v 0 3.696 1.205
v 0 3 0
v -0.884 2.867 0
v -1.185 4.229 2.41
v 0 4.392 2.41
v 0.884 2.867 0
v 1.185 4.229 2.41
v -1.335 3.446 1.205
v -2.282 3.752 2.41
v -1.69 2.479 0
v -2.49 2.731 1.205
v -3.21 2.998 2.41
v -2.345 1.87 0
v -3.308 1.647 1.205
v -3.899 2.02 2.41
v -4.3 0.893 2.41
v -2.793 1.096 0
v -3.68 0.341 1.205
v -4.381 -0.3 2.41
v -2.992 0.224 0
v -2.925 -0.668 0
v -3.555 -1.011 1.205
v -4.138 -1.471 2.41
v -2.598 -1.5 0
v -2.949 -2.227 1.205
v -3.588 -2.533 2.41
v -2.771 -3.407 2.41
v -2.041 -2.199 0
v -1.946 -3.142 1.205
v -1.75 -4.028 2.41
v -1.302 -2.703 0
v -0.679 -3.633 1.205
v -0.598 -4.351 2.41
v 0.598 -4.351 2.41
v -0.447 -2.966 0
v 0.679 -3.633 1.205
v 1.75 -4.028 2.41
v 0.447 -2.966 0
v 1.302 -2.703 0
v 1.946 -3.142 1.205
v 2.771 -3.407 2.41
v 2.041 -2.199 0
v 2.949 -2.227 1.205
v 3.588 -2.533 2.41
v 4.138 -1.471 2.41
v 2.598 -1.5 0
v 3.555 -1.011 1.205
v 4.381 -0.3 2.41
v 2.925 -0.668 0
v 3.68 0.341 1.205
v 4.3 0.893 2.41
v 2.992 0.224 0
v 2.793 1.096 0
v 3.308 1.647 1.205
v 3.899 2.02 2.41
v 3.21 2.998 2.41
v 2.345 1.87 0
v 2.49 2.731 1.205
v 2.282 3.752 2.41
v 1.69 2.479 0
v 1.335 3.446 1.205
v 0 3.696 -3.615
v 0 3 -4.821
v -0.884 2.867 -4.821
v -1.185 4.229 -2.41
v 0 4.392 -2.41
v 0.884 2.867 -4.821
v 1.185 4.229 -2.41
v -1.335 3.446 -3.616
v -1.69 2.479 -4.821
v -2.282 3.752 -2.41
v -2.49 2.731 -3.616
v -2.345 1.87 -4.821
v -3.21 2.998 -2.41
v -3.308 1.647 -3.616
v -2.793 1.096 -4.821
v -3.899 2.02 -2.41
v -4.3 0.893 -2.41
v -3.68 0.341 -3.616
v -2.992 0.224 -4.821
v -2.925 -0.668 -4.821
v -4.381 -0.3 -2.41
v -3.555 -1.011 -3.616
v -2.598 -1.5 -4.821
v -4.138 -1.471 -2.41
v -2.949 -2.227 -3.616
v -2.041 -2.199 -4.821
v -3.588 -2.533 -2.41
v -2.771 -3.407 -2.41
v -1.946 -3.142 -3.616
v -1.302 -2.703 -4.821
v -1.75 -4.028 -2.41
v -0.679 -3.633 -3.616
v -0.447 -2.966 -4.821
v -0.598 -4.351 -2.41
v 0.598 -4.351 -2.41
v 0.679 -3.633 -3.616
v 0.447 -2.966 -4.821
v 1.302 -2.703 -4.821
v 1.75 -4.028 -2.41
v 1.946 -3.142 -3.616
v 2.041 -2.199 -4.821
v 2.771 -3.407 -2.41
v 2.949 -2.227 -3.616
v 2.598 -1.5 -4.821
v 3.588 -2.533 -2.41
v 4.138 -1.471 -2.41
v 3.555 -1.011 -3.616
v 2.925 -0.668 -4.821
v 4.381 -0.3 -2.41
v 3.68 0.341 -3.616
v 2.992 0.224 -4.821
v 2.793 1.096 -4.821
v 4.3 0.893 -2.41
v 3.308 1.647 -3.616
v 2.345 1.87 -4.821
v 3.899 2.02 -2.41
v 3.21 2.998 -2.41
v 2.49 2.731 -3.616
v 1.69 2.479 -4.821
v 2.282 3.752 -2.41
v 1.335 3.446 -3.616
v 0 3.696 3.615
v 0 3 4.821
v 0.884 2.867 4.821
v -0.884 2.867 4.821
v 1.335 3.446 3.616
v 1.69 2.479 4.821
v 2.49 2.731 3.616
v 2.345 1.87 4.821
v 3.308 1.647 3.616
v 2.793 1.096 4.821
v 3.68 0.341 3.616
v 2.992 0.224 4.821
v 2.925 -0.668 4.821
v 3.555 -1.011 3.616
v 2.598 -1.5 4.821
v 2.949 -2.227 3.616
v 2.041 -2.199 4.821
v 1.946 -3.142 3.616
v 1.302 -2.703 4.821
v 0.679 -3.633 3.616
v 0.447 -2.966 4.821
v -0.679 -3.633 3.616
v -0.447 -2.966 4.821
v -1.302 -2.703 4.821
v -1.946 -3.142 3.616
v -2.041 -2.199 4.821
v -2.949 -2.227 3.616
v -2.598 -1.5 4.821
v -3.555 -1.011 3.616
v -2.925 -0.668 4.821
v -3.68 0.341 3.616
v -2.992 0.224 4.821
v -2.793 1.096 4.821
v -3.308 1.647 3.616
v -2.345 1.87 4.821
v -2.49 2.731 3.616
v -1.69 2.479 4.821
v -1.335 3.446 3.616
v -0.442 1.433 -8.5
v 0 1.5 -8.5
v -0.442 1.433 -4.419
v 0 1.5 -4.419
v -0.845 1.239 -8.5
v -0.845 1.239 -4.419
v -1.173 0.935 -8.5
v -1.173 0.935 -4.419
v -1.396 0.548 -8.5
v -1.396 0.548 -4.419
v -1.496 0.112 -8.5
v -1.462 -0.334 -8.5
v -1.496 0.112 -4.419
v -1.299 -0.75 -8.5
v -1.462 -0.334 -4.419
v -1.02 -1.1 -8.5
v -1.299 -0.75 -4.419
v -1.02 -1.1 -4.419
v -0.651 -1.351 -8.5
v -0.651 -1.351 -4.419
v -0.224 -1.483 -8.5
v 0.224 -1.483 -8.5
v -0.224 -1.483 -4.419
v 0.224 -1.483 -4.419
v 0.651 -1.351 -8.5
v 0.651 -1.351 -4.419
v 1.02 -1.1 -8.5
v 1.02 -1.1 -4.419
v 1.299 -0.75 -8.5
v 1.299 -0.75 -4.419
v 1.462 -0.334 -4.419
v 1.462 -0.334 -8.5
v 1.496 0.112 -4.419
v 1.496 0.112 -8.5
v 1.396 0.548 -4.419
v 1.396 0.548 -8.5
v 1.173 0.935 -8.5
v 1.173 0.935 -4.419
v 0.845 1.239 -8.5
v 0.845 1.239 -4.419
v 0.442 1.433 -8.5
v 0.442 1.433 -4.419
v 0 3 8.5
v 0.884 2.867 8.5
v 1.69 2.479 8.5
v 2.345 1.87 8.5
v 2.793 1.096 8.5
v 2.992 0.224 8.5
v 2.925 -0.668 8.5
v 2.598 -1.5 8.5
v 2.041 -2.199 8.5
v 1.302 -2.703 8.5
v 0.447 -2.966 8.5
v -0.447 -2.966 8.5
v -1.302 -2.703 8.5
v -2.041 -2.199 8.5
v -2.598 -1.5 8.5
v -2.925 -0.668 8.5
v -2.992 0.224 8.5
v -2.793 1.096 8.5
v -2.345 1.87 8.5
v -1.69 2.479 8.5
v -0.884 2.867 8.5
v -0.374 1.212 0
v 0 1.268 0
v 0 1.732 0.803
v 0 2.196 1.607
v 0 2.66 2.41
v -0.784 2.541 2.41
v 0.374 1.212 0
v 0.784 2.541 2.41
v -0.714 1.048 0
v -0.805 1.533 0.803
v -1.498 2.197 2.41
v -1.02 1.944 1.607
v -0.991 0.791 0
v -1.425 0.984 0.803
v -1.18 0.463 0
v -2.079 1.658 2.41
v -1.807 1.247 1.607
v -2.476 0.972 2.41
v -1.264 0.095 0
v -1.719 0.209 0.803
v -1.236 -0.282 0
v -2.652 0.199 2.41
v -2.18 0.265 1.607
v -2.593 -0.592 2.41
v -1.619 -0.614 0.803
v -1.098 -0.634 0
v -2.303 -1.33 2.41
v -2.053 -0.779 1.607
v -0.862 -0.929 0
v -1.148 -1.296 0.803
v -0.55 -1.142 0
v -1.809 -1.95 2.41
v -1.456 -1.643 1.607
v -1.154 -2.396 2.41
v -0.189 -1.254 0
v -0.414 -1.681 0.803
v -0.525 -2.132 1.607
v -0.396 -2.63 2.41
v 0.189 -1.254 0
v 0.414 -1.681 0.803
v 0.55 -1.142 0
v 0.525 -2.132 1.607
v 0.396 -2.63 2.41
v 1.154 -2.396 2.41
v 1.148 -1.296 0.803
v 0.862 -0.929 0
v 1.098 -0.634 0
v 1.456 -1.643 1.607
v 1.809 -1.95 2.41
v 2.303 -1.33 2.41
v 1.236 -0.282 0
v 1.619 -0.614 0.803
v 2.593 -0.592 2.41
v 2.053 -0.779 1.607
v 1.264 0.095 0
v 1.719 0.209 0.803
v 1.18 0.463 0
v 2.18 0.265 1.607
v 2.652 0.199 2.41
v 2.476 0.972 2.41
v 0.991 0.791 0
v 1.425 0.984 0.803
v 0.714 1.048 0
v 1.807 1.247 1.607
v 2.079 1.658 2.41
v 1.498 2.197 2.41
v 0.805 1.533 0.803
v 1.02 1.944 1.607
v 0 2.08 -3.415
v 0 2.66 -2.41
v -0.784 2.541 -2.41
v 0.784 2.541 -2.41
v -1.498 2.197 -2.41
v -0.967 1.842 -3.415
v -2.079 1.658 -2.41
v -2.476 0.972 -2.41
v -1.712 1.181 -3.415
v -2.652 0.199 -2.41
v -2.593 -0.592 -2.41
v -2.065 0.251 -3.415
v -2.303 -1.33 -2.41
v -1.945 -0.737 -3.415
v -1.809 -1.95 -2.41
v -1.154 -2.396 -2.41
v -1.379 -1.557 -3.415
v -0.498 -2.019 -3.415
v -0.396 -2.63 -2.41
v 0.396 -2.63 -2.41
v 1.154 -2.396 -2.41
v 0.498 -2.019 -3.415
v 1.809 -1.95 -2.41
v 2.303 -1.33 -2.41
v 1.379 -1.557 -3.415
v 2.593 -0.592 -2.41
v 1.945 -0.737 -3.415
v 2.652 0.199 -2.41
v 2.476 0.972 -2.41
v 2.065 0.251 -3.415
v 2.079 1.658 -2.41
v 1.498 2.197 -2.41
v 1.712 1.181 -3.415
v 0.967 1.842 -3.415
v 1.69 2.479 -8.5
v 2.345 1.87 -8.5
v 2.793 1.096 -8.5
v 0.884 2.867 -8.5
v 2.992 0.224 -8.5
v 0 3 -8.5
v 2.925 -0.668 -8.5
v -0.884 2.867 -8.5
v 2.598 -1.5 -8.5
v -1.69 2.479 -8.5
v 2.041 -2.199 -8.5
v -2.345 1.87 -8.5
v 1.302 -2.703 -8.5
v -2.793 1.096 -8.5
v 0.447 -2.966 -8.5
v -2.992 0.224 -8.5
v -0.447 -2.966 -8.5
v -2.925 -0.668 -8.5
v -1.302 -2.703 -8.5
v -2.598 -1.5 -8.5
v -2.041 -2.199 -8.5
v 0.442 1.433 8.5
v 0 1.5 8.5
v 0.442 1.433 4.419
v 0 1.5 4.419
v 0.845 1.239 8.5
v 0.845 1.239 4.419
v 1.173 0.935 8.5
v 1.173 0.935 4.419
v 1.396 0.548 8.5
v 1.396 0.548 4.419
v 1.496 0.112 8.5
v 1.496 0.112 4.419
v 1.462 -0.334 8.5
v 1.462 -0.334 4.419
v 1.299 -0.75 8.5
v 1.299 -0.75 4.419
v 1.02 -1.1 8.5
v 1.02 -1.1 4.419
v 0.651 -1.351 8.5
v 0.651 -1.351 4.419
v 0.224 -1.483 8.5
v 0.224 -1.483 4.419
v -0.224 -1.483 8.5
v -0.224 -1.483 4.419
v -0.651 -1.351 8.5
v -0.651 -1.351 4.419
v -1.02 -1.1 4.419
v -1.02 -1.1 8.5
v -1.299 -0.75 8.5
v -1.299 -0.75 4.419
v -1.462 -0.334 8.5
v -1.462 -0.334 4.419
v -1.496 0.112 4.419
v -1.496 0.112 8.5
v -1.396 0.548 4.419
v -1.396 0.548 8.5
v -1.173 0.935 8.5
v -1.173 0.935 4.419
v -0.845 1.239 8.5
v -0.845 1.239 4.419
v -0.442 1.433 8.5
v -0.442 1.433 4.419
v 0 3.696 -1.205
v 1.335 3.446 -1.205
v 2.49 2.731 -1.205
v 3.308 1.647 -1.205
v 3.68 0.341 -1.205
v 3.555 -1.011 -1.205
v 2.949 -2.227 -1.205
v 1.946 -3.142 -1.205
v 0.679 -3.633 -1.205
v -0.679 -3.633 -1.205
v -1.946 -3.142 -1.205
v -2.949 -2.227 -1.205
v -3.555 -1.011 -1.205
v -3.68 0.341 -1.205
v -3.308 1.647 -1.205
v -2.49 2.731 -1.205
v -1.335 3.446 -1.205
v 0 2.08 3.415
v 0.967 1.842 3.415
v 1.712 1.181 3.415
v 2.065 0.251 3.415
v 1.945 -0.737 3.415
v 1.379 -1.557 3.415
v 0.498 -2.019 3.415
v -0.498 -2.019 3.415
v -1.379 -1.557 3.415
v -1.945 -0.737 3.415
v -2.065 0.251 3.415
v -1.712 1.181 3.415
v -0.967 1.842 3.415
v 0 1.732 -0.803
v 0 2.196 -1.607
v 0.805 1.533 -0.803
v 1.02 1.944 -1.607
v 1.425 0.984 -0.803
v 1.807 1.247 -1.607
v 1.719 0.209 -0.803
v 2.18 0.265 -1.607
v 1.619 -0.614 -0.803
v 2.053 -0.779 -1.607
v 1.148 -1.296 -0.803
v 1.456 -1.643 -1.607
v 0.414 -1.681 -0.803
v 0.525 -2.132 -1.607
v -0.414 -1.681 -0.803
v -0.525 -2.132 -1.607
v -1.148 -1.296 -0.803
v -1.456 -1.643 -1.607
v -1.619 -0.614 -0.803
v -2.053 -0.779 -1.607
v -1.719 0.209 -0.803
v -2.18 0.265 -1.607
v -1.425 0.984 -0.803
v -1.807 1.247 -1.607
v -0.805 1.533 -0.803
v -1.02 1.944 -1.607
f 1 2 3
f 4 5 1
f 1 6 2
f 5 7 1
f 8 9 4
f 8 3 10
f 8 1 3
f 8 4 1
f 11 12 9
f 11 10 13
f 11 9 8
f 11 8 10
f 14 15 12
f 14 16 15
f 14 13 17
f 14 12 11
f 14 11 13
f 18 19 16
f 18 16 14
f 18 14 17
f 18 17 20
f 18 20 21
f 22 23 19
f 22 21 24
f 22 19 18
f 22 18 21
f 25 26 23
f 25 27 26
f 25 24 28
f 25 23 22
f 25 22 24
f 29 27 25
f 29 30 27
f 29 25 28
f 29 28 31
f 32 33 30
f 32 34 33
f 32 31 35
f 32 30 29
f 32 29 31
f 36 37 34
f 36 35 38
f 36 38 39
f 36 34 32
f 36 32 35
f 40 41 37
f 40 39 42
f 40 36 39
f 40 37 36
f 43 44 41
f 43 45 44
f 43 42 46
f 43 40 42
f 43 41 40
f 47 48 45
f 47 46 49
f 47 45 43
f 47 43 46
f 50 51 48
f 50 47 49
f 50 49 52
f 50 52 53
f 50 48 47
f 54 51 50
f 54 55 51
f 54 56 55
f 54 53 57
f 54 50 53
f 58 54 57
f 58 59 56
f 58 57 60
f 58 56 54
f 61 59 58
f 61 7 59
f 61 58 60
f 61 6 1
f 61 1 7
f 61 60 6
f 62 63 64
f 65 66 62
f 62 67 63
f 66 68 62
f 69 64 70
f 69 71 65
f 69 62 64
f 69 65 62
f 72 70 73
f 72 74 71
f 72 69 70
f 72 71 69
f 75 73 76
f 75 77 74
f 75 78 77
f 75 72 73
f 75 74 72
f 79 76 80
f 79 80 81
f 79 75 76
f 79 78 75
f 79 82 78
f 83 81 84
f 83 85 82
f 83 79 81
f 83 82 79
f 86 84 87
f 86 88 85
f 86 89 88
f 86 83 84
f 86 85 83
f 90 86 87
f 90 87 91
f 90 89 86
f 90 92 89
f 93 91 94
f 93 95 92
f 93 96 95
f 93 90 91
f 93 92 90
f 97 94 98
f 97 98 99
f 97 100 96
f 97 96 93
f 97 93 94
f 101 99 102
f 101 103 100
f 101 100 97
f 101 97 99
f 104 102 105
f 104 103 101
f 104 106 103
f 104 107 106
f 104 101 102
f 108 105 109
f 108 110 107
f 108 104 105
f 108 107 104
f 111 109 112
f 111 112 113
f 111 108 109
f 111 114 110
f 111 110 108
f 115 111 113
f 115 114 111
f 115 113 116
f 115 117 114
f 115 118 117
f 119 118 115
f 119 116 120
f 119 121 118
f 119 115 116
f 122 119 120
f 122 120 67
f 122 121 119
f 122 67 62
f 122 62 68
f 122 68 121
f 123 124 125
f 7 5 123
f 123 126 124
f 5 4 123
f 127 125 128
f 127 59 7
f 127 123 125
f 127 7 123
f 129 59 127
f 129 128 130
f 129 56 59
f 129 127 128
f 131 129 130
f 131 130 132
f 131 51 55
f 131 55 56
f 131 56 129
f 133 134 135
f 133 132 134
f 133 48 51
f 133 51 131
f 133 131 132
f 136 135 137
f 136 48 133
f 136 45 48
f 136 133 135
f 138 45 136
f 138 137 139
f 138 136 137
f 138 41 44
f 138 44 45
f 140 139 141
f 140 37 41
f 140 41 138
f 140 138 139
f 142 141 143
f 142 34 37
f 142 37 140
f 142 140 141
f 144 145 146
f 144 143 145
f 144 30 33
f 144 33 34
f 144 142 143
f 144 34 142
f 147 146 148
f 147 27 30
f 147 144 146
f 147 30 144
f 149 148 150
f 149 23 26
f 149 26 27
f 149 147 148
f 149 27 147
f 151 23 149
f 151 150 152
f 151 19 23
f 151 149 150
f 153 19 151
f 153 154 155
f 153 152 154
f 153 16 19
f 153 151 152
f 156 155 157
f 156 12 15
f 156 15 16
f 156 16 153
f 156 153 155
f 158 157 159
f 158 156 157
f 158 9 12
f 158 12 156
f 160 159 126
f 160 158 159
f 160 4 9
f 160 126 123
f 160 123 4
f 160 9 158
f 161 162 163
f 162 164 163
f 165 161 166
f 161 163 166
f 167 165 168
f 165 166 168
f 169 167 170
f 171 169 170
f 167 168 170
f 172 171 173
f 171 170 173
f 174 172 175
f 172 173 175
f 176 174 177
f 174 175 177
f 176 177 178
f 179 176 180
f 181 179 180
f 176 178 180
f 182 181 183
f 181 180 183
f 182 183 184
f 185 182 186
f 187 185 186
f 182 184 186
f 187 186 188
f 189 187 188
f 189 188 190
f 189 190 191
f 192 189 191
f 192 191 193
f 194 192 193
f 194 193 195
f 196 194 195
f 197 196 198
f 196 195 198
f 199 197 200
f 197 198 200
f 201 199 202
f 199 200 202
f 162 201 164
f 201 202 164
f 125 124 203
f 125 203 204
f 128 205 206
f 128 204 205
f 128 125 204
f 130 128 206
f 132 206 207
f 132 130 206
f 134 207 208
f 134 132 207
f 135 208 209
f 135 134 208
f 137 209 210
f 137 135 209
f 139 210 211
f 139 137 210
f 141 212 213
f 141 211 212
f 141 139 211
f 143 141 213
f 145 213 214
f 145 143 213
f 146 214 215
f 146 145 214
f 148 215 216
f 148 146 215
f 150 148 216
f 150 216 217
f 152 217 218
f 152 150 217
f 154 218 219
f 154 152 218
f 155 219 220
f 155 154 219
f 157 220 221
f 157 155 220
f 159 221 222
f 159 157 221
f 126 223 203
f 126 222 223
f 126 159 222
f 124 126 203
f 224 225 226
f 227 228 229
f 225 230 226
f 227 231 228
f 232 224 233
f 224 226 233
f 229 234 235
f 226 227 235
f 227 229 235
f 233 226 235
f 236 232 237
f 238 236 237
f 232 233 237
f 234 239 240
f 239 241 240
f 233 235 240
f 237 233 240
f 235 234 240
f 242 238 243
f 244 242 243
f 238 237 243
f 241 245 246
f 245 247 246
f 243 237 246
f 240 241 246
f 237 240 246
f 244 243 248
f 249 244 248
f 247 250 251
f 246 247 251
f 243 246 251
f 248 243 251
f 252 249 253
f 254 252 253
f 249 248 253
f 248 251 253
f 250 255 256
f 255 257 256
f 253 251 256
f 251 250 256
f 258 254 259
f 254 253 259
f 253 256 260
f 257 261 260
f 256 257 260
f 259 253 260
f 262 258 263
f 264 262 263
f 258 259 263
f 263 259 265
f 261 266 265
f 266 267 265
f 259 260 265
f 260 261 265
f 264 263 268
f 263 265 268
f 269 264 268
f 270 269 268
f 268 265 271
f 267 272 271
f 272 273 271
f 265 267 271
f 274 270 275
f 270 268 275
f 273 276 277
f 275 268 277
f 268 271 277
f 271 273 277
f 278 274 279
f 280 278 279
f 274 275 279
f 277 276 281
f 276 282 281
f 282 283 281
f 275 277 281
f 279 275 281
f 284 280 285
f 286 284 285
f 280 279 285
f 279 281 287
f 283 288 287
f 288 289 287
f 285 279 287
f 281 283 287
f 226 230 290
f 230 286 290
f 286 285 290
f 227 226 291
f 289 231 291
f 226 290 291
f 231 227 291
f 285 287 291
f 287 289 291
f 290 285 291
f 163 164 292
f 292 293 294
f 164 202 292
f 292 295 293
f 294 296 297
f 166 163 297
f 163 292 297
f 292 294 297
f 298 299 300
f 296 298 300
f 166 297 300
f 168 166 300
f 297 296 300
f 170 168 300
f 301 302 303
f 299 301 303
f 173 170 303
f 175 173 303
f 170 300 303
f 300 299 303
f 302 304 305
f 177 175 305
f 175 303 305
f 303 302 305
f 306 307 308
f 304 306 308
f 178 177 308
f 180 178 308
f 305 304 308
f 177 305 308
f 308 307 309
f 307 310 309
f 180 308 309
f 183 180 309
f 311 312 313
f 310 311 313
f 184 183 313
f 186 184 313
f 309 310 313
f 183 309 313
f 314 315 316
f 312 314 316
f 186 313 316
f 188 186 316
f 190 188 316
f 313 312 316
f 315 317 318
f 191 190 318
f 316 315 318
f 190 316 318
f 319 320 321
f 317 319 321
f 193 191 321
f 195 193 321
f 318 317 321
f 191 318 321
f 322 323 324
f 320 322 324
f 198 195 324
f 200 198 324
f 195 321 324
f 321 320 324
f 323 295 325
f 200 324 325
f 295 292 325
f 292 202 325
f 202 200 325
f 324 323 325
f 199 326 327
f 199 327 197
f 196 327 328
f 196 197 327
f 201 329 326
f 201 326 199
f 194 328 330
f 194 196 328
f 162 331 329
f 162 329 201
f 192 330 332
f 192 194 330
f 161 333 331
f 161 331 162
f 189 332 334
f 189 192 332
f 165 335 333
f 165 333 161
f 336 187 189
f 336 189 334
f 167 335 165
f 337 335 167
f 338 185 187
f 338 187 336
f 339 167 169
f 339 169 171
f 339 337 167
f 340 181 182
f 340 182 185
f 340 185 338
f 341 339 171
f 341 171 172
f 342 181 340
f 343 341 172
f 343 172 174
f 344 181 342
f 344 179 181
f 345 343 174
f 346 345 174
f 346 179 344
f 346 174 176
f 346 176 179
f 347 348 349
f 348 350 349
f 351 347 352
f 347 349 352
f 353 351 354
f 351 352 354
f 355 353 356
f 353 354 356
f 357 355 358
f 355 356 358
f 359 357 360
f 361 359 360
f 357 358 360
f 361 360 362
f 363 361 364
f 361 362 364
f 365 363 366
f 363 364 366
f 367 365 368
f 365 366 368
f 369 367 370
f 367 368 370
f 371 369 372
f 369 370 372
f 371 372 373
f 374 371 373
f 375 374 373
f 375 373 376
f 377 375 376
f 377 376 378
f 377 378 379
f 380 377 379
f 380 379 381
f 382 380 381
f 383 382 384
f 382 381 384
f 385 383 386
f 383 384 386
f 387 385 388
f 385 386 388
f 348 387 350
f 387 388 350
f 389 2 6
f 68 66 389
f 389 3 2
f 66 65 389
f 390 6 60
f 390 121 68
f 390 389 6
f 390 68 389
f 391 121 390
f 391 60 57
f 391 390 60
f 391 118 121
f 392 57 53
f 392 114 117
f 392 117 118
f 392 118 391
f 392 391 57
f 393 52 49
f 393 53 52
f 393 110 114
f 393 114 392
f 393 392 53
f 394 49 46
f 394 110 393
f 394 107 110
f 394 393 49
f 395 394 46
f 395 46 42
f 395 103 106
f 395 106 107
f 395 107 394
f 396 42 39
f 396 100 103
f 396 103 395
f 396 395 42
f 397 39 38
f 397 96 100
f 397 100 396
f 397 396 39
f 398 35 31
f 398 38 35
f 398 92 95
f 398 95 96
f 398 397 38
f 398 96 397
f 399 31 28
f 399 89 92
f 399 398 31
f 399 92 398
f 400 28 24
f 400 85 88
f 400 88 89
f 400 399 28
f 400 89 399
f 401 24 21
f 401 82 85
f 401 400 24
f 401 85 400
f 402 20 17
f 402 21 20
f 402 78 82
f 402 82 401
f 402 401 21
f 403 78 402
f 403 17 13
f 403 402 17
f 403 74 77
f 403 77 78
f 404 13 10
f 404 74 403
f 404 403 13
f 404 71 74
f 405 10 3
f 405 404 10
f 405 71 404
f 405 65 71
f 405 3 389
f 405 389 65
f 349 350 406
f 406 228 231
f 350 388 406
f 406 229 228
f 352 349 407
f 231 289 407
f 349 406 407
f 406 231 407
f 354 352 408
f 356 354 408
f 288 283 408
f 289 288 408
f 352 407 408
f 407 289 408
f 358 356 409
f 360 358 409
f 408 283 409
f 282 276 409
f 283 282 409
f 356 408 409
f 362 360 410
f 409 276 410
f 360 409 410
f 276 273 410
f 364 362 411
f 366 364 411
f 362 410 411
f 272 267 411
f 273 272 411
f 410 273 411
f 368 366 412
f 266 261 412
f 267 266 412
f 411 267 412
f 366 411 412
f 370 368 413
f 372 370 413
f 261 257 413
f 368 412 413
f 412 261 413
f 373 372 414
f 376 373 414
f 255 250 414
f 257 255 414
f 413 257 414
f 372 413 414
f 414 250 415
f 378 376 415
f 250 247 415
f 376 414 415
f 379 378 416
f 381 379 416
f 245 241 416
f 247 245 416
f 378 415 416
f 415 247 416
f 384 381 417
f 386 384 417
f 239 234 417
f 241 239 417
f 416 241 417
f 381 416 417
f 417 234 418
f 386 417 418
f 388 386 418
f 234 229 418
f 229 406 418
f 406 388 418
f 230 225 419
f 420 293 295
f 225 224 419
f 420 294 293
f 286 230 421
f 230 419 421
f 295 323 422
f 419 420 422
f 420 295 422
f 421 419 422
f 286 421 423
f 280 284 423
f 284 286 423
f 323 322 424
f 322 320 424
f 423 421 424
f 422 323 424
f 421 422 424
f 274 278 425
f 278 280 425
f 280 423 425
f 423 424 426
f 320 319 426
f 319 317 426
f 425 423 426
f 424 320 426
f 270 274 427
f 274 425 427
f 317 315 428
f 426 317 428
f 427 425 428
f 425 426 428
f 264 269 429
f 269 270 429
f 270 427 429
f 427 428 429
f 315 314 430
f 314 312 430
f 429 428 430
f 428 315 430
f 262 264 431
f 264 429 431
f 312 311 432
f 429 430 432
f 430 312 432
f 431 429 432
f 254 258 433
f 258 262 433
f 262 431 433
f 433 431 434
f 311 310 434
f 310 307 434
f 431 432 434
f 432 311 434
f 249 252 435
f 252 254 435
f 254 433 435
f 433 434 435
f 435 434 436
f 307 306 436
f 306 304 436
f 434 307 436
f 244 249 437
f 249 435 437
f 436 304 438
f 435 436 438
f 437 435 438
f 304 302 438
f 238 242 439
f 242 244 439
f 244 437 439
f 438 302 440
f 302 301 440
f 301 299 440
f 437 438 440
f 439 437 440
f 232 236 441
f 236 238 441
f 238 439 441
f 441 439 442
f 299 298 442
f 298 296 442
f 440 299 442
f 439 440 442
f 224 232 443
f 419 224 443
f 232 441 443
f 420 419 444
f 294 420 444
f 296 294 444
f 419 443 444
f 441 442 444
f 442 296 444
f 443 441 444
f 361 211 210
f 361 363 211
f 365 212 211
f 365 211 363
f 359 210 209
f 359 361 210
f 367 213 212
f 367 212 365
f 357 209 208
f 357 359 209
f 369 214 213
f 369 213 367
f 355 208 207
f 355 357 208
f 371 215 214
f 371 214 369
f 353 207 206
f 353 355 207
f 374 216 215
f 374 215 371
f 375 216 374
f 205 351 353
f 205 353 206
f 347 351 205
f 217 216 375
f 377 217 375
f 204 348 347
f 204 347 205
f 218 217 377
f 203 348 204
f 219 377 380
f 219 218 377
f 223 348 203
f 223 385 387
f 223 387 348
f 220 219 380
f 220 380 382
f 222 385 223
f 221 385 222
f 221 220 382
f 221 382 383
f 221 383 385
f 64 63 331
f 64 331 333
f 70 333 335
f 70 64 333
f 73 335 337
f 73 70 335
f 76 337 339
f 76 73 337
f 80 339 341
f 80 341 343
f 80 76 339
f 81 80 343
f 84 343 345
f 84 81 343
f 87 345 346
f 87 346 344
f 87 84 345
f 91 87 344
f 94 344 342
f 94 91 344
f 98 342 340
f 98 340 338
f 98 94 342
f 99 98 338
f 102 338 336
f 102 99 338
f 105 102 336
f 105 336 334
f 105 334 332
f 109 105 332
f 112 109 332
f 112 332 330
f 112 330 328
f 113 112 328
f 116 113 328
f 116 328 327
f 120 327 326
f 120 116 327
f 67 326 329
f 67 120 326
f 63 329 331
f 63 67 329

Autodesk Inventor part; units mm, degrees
ref_plane "YZ Plane" through (0, 0, 0) normal (1, 0, 0) x (0, 1, 0)
ref_plane "XZ Plane" through (0, 0, 0) normal (0, 1, 0) x (-1, 0, 0)
ref_plane "XY Plane" through (0, 0, 0) normal (0, 0, 1) x (1, 0, 0)
sketch "Sketch1" plane through (0, 0, 0) normal (1, 0, 0) x (0, 1, 0)
  line L0 (0, 0) -> (0, 8.5)
  line L1 (0, 8.5) -> (3, 8.5)
  line L2 (3, 0) -> (4.3916, 2.4103)
  line L3 (3, 0) -> (5.7832, 0) construction
  line L4 (4.3916, 2.4103) -> (3, 4.8207)
  line L5 (3, 0) -> (0, 0)
  line L6 (3, 8.5) -> (3, 7.5231)
  line L7 (3, 7.5231) -> (3, 4.8207)
  dimension "d0" = 8.5
  dimension "d1" = 3
  dimension "d3" = 60
  dimension "d4" = 120
revolve "Revolution1" add sketch "Sketch1" angle 360 about axis through (0, 0, 0) along (0, 0, 1)
mirror "Mirror1" about plane through (0, 0, 0) normal (0, 0, -1)
shell "Shell1" thickness 1.5 removed faces 2 at (-1.0949, -0.5351, 8.5) at (-1.0949, -0.5351, -8.5)
properties part number "Flex_3DPrint"
